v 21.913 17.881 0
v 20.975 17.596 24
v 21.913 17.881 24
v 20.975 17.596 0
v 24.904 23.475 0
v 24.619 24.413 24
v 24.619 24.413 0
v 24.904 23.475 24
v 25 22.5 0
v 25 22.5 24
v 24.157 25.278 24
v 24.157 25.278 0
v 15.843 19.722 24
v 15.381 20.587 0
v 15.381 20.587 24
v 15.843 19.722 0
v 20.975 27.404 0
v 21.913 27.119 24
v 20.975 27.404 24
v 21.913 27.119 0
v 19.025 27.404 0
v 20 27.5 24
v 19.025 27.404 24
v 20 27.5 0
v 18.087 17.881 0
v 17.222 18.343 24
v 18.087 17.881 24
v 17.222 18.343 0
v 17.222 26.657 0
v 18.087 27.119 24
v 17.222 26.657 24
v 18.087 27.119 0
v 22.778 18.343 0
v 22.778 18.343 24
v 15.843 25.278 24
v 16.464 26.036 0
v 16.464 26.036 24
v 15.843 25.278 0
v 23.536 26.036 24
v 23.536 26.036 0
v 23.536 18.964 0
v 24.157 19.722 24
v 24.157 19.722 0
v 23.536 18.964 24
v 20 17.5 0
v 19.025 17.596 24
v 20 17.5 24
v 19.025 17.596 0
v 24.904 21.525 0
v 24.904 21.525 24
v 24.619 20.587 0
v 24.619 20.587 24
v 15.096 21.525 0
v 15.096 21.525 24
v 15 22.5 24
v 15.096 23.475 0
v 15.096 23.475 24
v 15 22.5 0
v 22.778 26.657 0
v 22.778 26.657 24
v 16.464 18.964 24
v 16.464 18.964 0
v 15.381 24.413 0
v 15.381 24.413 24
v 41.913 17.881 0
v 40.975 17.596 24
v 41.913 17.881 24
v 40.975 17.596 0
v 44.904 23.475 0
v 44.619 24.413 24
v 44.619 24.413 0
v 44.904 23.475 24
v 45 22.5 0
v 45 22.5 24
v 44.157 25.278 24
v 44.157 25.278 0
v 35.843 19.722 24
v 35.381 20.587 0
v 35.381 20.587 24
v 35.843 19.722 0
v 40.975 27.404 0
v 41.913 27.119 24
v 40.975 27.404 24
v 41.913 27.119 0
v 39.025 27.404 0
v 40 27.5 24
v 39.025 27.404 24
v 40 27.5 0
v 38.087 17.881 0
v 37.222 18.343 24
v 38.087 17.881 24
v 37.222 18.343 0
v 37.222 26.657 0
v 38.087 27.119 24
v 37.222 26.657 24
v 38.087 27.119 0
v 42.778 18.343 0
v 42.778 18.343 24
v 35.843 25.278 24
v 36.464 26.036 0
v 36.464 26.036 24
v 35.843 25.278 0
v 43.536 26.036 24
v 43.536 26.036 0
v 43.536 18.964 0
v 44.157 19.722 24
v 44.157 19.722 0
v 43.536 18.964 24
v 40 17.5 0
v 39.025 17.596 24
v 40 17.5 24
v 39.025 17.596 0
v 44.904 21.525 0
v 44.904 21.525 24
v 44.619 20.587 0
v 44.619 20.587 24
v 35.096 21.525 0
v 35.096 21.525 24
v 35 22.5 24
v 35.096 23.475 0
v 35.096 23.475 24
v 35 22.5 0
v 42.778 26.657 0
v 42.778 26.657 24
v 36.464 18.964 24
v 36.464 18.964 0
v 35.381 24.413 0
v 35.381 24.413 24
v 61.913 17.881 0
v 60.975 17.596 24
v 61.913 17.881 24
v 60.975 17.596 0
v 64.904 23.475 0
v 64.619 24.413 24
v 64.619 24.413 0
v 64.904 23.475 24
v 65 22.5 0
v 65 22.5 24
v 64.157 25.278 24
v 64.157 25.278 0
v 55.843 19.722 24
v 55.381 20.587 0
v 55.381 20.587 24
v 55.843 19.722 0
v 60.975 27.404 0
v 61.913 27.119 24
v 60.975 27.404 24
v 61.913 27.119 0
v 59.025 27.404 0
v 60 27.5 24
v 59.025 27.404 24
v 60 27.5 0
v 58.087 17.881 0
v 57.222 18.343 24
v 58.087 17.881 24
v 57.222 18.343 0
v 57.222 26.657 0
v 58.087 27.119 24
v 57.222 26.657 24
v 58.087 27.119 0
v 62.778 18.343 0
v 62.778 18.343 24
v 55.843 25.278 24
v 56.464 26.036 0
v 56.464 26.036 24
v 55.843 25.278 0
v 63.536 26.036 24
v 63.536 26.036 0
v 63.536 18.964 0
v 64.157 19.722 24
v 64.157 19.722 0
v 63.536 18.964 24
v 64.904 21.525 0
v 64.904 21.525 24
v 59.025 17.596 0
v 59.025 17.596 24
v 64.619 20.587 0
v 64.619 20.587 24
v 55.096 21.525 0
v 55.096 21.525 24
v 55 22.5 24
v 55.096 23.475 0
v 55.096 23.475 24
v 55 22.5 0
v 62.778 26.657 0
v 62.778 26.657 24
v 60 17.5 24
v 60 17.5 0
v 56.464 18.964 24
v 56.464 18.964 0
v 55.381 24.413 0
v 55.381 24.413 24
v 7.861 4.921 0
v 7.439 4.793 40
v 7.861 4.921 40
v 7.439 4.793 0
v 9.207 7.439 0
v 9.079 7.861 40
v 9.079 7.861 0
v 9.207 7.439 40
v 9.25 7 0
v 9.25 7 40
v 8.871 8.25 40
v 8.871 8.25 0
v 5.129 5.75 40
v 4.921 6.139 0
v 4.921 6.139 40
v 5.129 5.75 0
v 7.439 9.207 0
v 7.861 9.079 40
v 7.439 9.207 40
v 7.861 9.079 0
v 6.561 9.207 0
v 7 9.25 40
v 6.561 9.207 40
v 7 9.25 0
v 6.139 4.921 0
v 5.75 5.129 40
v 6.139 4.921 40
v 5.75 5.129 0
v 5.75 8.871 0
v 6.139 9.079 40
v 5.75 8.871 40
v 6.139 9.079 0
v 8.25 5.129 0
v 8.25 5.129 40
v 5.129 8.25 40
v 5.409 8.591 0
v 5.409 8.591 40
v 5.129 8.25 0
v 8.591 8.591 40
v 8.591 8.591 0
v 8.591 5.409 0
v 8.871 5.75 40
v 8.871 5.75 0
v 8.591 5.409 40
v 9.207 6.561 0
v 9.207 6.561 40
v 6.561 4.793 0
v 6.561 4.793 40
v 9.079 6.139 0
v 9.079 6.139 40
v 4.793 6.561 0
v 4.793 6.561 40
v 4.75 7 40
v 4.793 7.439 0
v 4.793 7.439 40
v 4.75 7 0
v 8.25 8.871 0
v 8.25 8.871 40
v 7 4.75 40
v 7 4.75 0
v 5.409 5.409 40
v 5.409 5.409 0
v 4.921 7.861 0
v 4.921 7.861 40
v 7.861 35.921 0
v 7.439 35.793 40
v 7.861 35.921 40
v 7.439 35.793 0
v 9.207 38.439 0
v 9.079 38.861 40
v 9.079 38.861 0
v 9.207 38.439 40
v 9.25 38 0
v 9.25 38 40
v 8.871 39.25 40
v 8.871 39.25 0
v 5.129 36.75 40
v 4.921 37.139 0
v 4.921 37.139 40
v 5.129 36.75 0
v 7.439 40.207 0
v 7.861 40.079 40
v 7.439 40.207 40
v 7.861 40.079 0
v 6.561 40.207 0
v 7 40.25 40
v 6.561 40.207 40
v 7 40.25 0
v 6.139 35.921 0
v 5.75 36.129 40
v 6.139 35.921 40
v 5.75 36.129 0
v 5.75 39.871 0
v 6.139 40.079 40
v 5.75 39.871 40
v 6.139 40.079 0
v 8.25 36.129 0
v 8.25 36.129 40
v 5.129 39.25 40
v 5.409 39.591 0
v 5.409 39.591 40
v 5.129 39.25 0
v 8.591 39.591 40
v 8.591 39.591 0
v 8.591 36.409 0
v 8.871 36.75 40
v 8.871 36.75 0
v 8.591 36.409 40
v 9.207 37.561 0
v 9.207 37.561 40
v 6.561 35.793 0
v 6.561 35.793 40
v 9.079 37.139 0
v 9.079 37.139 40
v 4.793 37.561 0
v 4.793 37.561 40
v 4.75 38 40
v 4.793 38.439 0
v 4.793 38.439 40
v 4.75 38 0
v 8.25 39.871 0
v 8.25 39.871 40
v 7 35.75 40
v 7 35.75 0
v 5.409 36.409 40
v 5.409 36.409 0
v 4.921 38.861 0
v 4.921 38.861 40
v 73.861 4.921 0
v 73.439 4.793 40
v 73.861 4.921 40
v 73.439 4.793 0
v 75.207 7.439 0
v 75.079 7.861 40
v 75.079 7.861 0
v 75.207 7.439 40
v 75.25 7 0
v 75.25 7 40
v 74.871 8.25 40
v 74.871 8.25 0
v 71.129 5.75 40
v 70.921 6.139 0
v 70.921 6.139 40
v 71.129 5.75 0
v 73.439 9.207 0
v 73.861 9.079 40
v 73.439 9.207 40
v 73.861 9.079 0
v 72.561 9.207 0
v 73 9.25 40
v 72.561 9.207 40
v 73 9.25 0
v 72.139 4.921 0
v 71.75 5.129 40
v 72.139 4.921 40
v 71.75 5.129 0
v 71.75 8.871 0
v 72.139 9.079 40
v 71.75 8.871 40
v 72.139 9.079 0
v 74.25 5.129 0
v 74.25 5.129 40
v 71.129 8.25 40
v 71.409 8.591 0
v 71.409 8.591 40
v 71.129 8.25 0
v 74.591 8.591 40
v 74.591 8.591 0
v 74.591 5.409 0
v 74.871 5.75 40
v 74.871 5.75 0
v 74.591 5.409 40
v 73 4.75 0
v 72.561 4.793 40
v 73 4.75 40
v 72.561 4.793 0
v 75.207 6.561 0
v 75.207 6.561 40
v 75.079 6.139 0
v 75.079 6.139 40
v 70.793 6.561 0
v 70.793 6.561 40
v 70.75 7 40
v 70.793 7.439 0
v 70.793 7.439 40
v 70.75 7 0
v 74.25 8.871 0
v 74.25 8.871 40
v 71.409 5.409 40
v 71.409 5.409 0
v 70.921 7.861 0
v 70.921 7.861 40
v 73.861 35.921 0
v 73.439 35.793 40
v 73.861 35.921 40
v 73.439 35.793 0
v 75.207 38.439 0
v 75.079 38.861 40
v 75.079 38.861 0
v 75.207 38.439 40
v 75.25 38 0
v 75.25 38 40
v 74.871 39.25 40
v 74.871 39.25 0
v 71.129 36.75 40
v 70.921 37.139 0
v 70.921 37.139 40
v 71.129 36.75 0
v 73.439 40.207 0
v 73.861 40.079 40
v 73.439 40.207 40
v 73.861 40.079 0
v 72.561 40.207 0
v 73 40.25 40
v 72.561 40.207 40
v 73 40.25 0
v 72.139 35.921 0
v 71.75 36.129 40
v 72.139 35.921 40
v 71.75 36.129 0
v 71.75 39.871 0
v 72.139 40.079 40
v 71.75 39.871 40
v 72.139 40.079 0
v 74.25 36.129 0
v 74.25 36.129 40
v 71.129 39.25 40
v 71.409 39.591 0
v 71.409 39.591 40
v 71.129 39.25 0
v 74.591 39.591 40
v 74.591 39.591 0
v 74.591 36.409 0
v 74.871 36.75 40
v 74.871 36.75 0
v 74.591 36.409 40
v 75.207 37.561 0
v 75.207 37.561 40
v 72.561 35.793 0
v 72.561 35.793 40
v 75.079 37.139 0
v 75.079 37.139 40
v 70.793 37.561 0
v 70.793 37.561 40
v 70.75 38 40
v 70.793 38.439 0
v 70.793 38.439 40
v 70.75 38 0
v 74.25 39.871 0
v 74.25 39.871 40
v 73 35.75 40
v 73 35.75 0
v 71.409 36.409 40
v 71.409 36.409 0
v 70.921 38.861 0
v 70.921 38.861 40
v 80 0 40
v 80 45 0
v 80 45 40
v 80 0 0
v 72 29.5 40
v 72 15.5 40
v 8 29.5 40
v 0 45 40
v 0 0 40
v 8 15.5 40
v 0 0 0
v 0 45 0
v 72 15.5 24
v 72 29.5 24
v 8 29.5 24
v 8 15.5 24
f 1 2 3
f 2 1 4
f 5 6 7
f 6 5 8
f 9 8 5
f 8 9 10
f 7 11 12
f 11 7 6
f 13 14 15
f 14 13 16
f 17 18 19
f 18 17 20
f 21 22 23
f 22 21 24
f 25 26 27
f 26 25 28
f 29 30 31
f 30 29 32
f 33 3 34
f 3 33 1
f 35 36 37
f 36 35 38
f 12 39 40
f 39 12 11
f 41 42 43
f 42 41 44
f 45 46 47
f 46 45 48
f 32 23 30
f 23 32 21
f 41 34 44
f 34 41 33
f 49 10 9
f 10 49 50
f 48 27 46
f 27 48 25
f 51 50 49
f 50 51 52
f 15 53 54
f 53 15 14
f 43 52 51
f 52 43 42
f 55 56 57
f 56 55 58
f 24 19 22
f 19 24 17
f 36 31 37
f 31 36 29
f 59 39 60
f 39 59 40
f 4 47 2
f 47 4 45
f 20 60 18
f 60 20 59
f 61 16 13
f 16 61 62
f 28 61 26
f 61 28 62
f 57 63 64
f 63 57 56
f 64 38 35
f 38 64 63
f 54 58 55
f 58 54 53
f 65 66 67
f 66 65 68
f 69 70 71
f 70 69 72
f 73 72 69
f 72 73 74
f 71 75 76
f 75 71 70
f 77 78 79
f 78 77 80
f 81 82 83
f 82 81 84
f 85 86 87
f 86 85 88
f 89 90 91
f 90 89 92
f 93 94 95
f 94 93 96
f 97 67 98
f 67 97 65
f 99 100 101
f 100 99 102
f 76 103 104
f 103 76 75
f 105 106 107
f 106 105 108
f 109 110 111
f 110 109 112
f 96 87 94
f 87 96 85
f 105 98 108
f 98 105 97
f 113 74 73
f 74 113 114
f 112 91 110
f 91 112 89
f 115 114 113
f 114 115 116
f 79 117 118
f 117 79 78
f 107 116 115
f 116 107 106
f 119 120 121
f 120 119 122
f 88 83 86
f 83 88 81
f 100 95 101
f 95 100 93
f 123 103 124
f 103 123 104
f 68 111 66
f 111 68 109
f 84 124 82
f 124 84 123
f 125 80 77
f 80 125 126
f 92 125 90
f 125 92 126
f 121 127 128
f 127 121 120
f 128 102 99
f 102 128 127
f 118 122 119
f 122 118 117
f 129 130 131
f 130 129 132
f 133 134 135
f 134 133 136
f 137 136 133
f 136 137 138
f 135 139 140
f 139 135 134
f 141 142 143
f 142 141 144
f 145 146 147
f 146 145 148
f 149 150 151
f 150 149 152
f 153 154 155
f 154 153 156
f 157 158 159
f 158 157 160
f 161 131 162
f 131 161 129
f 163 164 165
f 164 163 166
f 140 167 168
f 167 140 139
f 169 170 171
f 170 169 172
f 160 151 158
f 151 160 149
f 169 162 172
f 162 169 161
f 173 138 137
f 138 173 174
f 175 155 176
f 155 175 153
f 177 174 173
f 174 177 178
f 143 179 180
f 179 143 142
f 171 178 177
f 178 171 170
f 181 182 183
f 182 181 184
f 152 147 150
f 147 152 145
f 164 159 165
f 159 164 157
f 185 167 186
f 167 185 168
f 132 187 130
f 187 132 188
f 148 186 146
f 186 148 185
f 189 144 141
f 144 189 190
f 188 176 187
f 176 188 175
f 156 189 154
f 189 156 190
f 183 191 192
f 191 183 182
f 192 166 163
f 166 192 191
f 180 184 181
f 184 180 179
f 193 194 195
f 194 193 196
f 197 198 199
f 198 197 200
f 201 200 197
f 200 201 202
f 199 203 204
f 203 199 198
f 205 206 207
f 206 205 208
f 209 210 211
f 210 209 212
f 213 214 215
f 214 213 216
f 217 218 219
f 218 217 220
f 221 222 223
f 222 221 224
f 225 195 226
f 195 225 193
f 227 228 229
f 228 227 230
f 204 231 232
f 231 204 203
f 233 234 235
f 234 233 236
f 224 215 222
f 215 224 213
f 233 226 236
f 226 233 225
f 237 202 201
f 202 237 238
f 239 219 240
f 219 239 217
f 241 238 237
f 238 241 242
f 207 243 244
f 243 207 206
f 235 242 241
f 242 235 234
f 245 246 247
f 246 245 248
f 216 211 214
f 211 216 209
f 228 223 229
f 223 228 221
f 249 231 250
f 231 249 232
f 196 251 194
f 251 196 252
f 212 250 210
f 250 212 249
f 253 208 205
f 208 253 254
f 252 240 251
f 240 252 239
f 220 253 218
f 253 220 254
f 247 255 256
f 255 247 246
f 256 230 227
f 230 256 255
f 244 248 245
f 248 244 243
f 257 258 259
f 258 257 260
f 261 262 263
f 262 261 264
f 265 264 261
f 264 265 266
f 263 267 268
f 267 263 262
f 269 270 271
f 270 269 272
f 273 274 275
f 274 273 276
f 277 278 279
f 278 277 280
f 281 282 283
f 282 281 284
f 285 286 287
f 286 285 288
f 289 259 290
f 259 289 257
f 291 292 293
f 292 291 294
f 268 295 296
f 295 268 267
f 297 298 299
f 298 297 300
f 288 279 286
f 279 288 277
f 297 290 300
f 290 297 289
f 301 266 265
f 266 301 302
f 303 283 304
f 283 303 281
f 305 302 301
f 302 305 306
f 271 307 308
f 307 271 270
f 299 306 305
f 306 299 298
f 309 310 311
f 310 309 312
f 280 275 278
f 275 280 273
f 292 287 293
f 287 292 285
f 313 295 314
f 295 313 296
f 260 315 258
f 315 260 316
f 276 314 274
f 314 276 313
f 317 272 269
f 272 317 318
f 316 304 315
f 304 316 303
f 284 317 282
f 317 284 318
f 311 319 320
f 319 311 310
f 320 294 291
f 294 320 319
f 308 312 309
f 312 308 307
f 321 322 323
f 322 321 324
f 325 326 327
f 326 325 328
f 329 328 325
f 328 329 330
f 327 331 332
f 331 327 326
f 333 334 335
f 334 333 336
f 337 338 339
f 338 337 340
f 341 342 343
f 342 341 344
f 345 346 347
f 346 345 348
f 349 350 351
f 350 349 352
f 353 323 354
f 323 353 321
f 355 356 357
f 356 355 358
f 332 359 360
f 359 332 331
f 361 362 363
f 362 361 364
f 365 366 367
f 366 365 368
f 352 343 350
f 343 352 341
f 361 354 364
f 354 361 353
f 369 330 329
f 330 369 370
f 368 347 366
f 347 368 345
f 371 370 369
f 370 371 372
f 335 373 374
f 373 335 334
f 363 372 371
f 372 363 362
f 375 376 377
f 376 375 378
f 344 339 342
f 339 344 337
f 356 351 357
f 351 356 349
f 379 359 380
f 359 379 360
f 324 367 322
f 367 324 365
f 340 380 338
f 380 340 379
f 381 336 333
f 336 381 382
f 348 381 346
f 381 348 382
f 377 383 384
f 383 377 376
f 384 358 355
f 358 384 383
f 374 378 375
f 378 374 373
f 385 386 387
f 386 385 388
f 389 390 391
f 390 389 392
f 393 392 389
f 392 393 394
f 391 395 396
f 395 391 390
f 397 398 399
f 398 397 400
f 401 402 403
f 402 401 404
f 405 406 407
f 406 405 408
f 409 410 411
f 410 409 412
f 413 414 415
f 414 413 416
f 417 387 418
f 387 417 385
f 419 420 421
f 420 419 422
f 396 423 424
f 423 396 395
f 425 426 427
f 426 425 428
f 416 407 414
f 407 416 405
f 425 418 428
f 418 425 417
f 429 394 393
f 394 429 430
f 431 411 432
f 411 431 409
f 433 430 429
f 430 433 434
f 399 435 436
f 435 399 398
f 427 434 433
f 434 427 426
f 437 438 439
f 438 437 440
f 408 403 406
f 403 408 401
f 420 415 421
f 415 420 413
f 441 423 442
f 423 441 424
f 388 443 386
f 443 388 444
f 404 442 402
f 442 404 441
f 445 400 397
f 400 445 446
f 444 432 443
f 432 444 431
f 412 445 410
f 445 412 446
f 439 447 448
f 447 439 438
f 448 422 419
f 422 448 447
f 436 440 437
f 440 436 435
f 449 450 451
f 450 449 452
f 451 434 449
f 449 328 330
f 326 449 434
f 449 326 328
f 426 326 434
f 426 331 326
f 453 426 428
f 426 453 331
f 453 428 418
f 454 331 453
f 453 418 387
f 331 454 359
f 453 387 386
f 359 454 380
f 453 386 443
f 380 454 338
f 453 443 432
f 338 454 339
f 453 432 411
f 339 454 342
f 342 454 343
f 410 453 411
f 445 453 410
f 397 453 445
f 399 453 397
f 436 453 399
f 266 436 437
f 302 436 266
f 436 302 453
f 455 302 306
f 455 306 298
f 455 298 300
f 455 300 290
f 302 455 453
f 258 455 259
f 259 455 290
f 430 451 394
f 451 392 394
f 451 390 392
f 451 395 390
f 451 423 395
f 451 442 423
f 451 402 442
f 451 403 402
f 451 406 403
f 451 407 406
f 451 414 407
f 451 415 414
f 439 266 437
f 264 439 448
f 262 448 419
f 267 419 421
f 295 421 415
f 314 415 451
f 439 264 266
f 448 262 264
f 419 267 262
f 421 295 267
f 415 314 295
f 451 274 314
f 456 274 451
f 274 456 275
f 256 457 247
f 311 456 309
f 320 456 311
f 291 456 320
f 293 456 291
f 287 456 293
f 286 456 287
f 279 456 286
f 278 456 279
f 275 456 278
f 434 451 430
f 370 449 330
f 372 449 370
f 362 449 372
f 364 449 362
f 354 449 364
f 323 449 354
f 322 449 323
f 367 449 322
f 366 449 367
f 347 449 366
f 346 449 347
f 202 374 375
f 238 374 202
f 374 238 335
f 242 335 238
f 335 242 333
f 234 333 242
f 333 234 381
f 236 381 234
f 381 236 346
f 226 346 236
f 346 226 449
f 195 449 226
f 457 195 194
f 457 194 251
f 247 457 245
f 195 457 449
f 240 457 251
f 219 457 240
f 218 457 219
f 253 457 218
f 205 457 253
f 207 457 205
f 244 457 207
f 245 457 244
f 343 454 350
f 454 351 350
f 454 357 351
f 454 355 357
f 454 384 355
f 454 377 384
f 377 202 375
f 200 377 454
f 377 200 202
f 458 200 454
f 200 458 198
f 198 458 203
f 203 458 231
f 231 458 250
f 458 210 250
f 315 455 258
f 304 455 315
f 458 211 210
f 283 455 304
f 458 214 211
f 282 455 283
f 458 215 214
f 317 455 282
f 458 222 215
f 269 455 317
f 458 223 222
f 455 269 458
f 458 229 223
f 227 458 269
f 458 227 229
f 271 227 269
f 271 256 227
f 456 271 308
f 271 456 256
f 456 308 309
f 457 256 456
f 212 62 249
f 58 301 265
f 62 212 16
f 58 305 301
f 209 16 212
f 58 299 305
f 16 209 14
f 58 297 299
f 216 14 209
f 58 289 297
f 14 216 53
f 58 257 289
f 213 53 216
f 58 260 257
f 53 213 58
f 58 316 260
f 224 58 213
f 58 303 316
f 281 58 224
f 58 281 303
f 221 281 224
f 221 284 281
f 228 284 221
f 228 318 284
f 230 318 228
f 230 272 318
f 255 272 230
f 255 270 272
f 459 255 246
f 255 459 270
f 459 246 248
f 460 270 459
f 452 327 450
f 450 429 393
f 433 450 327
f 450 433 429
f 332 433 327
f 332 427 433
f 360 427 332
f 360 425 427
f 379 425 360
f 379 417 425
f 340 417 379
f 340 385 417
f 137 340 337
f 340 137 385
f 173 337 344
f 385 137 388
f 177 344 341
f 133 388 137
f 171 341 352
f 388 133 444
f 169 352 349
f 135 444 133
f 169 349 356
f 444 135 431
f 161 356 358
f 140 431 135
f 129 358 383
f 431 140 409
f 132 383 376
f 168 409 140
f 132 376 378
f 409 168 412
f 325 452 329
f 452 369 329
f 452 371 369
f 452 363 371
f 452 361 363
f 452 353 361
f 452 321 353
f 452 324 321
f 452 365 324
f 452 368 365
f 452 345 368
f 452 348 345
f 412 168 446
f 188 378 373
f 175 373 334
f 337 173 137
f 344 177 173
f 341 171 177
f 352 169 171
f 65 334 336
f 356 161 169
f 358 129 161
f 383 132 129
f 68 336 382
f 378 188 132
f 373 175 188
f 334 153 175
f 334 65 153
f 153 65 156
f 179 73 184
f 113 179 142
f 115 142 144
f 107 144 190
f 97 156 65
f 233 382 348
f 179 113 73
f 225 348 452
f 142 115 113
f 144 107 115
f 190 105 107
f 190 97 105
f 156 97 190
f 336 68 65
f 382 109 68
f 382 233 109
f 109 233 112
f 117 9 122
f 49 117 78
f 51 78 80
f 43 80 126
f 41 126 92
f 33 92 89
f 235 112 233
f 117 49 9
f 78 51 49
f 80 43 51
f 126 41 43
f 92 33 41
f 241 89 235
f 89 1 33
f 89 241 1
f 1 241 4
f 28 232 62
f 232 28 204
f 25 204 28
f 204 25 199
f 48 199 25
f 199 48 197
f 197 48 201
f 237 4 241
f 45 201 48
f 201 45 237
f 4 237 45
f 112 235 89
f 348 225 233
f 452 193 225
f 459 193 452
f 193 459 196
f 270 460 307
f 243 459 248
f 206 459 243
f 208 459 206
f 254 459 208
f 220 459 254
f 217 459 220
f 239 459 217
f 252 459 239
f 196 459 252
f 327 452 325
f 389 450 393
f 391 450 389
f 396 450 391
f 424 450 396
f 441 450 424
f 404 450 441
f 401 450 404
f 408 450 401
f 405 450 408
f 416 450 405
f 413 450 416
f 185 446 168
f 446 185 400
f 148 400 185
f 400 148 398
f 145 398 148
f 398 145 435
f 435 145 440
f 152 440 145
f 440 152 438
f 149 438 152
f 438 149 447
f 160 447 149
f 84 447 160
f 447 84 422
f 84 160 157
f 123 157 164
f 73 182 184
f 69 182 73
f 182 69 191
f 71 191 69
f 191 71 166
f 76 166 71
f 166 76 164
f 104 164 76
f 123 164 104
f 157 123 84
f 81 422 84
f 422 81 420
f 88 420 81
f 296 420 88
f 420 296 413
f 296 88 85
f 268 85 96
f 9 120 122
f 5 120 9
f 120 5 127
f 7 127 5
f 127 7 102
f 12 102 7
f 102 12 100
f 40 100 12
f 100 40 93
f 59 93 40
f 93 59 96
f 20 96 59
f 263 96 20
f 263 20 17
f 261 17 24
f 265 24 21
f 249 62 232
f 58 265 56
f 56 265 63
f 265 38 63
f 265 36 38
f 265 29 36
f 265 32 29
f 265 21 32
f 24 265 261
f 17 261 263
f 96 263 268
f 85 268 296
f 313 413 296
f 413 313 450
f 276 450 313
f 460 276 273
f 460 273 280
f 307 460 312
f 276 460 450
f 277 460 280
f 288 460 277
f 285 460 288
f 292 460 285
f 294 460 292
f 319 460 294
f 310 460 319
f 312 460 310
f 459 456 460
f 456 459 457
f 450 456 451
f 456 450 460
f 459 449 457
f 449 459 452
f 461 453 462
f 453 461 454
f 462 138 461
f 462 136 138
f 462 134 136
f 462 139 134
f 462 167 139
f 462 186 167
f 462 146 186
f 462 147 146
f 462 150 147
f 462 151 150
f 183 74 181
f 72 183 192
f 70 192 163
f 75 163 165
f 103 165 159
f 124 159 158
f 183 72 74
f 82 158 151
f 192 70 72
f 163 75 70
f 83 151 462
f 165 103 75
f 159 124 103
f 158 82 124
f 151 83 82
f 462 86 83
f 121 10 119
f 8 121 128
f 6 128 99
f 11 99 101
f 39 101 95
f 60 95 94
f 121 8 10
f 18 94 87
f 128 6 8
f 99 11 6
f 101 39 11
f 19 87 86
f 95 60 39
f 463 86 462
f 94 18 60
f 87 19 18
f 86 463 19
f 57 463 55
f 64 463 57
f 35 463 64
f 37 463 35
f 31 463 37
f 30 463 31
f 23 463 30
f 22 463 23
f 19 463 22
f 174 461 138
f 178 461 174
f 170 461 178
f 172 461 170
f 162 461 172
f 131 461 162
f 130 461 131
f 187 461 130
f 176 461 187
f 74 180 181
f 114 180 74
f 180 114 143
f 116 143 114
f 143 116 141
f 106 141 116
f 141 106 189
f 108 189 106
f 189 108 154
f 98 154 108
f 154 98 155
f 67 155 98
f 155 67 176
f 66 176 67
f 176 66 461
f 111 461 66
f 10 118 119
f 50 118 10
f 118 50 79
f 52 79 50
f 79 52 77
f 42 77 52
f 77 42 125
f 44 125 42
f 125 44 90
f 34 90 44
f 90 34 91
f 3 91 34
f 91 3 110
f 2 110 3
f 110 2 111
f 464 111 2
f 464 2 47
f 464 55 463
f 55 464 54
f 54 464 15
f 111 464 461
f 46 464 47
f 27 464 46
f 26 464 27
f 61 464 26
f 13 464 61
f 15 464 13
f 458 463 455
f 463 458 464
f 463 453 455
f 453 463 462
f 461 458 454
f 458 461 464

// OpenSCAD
$fn = 32;

// ----------------------------------------------------------------------
// Manifold block: gallery_top manifold
// ----------------------------------------------------------------------

// --- parameters (mm) ---
block_l = 80;             // block length, X
block_w = 45;             // block width, Y
block_h = 40;             // block height, Z
port_d = 10;              // port bore diameter
port_pitch = 20;          // port pitch along X
gallery_d = 14;           // top gallery width, Y
gallery_depth = 16;       // gallery pocket depth
wall_p = 8;               // gallery end wall thickness, X
mnt_d = 4.5;              // mounting hole diameter
mnt_in = 7;               // mounting hole inset from the edges

n_ports = 3;  // ports in the row
port_x0 = (block_l - (n_ports - 1) * port_pitch) / 2;  // first port X

difference() {
  cube([block_l, block_w, block_h]);
  for (i = [0 : n_ports - 1])
    translate([port_x0 + i * port_pitch, block_w / 2, -1])
      cylinder(h = block_h + 2, d = port_d);
  translate([wall_p, block_w / 2 - gallery_d / 2, block_h - gallery_depth])
    cube([block_l - 2 * wall_p, gallery_d, gallery_depth + 1]);
  for (cx = [mnt_in, block_l - mnt_in])
    for (cy = [mnt_in, block_w - mnt_in])
      translate([cx, cy, -1]) cylinder(h = block_h + 2, d = mnt_d);
}
